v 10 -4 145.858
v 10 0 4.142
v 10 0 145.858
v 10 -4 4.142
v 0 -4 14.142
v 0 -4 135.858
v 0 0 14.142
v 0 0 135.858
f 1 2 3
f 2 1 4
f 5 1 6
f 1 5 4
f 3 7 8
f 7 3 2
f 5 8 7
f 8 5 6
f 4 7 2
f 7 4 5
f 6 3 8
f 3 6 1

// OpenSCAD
module support_angle(length = 150, width = 10, rot_vec = [90,0,0]) {
    rotate(rot_vec)
    difference() {
        cube([width, length, 4]);
        
        translate([10,-10,-1])
        rotate([0,0,45])
        cube([10, 30, 6]);
        
        translate([-10,length - 10,-1])
        rotate([0,0,-45])
        cube([10, 30, 6]);
    }
}
support_angle();
